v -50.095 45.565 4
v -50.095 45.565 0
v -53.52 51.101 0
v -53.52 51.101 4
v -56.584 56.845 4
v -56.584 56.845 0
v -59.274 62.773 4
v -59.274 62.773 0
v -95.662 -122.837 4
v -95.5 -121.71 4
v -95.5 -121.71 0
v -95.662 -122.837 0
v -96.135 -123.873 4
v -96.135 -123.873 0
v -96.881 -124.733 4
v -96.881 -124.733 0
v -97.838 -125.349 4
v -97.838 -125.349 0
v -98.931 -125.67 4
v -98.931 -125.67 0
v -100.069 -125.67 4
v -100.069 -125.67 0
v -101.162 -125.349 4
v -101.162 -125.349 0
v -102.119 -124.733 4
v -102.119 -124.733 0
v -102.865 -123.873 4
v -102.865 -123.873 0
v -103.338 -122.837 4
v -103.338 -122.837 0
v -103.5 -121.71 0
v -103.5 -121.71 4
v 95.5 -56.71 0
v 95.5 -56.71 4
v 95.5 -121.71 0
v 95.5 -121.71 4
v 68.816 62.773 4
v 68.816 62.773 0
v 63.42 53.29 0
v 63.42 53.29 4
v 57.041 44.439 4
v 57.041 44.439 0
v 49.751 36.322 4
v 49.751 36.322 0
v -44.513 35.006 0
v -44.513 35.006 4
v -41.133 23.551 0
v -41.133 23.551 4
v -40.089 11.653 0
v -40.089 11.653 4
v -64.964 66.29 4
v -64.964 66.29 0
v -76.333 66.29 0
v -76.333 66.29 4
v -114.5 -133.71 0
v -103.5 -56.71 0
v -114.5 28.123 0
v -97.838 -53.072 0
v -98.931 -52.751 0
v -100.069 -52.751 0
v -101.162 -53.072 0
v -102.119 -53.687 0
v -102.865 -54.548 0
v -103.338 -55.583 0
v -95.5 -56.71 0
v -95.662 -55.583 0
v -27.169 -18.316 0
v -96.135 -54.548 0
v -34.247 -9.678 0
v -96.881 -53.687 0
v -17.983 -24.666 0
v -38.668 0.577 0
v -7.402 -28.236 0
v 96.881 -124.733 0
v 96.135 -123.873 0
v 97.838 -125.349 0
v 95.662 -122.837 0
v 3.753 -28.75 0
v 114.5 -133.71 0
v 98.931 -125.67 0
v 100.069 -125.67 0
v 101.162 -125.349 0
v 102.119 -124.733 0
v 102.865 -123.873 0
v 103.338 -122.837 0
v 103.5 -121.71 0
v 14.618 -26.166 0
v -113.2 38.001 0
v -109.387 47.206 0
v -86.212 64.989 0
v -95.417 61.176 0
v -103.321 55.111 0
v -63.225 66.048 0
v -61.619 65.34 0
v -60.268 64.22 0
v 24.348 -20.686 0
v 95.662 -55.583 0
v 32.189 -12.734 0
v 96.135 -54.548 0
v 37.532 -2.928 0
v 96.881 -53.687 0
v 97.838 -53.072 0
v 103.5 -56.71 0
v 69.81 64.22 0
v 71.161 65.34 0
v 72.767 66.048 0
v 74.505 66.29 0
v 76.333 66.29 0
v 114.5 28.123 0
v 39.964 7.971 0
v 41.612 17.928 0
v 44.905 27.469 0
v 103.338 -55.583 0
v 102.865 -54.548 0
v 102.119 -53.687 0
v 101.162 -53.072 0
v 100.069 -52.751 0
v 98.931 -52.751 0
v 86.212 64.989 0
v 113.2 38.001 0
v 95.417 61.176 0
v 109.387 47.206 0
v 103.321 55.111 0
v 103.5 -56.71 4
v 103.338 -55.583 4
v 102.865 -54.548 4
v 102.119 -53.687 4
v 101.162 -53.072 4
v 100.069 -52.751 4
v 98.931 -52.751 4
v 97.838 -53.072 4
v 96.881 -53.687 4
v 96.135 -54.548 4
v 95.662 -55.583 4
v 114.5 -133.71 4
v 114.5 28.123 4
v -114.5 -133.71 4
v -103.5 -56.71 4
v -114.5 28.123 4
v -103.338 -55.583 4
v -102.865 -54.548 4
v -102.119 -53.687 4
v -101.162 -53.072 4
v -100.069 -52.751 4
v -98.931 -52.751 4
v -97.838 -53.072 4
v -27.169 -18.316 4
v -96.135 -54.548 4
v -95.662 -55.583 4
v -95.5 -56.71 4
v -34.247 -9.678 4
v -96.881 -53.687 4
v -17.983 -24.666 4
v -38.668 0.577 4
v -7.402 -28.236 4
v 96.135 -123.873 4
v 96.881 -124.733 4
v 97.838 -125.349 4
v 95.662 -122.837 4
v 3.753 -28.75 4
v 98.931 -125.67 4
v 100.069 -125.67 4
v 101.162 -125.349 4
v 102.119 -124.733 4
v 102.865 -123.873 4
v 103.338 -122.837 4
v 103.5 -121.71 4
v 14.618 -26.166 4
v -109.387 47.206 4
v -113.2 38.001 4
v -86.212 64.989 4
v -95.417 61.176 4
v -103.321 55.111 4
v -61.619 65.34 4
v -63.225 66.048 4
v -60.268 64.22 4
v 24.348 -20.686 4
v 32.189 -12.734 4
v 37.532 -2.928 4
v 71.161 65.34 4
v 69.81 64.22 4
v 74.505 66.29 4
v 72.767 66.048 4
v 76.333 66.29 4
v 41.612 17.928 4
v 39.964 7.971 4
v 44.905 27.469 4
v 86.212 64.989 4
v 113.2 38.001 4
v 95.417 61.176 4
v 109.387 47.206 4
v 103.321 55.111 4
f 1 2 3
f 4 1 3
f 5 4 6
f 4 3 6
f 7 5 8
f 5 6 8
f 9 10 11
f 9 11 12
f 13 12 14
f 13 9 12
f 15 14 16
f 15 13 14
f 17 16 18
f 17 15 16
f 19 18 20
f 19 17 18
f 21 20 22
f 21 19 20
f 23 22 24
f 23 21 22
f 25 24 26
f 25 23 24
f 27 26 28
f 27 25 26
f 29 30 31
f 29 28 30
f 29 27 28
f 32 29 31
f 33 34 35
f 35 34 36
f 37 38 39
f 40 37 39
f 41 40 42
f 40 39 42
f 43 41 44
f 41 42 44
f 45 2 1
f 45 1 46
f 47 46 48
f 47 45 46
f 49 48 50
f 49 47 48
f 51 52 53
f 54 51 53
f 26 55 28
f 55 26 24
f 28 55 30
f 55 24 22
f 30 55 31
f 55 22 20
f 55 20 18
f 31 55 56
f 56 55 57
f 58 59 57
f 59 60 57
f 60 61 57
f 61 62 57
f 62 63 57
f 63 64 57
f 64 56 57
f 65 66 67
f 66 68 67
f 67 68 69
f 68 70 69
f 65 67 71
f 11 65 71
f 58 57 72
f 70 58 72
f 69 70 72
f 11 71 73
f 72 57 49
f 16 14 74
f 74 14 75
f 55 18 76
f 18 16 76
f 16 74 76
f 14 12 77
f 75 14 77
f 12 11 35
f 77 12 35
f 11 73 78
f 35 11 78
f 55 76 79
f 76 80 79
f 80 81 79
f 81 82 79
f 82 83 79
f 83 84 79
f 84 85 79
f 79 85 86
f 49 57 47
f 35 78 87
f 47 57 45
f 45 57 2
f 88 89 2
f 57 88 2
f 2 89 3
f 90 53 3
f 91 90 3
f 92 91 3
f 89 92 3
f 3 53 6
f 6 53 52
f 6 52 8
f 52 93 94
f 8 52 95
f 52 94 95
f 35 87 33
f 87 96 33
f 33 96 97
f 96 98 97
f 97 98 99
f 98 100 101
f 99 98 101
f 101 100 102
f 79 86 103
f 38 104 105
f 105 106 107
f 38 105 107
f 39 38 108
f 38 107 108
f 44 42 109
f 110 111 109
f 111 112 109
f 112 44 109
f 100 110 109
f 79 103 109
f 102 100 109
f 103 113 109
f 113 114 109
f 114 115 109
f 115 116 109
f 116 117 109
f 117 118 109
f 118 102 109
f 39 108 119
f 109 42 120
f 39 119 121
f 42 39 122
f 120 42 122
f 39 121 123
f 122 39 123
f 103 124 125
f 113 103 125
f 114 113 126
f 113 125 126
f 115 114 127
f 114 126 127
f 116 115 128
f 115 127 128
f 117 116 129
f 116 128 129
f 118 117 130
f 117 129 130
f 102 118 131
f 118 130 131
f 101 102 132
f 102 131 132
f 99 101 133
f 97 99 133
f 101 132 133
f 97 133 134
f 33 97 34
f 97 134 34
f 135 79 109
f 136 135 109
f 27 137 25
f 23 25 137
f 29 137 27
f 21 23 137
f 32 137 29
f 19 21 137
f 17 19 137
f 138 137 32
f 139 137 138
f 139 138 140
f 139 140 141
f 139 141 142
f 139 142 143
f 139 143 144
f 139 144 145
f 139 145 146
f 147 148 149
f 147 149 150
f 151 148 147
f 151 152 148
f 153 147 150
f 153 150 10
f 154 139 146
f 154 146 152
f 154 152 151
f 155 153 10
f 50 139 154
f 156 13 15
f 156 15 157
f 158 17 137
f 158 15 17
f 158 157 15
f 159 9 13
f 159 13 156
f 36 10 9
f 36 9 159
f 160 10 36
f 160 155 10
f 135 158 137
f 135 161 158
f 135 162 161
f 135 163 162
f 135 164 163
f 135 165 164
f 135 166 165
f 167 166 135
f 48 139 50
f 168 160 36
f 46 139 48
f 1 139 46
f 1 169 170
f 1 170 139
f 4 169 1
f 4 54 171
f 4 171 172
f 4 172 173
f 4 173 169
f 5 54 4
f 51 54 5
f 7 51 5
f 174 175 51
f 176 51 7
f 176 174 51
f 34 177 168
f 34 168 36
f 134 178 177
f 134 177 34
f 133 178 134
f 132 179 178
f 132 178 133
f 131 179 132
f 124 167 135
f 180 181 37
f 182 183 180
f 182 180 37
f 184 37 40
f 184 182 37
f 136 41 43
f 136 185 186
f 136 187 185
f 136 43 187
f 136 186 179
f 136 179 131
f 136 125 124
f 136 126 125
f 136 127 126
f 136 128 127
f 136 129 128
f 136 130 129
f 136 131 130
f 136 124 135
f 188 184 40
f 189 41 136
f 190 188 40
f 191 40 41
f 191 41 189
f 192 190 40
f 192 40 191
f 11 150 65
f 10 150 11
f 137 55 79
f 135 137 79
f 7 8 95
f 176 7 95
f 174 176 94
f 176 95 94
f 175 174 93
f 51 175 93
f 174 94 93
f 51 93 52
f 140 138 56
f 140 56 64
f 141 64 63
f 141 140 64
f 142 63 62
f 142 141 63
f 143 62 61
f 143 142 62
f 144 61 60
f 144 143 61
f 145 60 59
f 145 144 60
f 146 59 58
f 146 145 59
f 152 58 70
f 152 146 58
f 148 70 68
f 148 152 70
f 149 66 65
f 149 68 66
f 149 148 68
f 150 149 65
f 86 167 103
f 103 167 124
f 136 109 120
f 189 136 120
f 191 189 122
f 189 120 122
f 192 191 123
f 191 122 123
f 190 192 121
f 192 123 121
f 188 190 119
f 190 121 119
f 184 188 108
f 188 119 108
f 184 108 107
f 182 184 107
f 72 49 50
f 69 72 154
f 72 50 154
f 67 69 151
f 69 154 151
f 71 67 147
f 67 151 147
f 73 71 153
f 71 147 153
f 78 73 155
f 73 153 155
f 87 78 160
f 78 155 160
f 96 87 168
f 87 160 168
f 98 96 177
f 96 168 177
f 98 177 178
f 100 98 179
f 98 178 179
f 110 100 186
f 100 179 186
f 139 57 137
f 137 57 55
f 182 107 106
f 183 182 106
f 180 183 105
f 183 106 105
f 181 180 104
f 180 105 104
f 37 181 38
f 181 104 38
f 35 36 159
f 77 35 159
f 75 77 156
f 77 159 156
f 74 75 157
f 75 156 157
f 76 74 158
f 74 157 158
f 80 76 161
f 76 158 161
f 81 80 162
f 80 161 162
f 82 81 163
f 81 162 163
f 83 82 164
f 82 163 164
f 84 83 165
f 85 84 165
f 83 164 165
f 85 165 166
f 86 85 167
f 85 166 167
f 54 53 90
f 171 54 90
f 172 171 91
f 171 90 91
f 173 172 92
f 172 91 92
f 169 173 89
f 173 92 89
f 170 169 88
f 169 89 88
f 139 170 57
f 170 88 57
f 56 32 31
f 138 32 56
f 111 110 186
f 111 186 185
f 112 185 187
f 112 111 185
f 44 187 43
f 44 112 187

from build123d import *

# Parameters (mm, degrees)
BOSS_EXTRUDE1_DEPTH = 4
CUT_EXTRUDE1_DEPTH  = 10
SKETCH6_R           = 40.091527734
CUT_EXTRUDE2_DEPTH  = 4
FILLET1_START       = -1
FILLET1_DEPTH       = 6


with BuildPart() as part:
    # Sketch1 → Boss-Extrude1 (new body)
    with BuildSketch(Plane.XY):
        with BuildLine():
            Line((76.333328469, 66.289722012), (74.505251863, 66.289722012))
            ThreePointArc((74.505251863, 66.289722012), (71.161019545, 65.339696261), (68.815702909, 62.773389851))
            ThreePointArc((68.815702909, 62.773389851), (60.349327785, 48.779313667), (49.750676494, 36.322096209))
            ThreePointArc((49.750676494, 36.322096209), (34.635353478, 21.965885228), (23.967617679, 4.055742947))
            ThreePointArc((23.967617679, 4.055742947), (14.404733147, -9.267078846), (-1.356711824, -13.797331986))
            ThreePointArc((-1.356711824, -13.797331986), (-15.492367955, -8.455246222), (-23.967617153, 4.055741173))
            ThreePointArc((-23.967617153, 4.055741173), (-31.555286979, 21.388261286), (-43.172925895, 36.322097125))
            ThreePointArc((-43.172925895, 36.322097125), (-52.235366406, 48.931803578), (-59.274045863, 62.773390061))
            ThreePointArc((-59.274045863, 62.773390061), (-61.619362494, 65.339696323), (-64.963594711, 66.289722012))
            Line((-64.963594711, 66.289722012), (-76.333336807, 66.289722012))
            ThreePointArc((-76.333336807, 66.289722012), (-103.321243377, 55.110962932), (-114.5, 28.123055345))
            Line((-114.5, 28.123055345), (-114.5, -133.710277988))
            Line((-114.5, -133.710277988), (114.5, -133.710277988))
            Line((114.5, -133.710277988), (114.5, 28.123055345))
            ThreePointArc((114.5, 28.123055345), (103.321240429, 55.11096588), (76.333328469, 66.289722012))
        make_face()
    extrude(amount=BOSS_EXTRUDE1_DEPTH)

    # Sketch2 → Cut-Extrude1 (cut)
    with BuildSketch(Plane.XY.offset(4)):
        with BuildLine():
            Line((-95.500001569, -56.710277988), (-95.500001569, -121.710277988))
            ThreePointArc((-95.500001569, -121.710277988), (-99.500001569, -125.710277988), (-103.500001569, -121.710277988))
            Line((-103.500001569, -121.710277988), (-103.500001569, -56.710277988))
            ThreePointArc((-103.500001569, -56.710277988), (-99.500001569, -52.710277988), (-95.500001569, -56.710277988))
        make_face()
        with BuildLine():
            Line((95.500001569, -56.710277988), (95.500001569, -121.710277988))
            ThreePointArc((95.500001569, -121.710277988), (99.500001569, -125.710277988), (103.500001569, -121.710277988))
            Line((103.500001569, -121.710277988), (103.500001569, -56.710277988))
            ThreePointArc((103.500001569, -56.710277988), (99.500001569, -52.710277988), (95.500001569, -56.710277988))
        make_face()
    extrude(amount=-CUT_EXTRUDE1_DEPTH, mode=Mode.SUBTRACT)

    # Sketch6 → Cut-Extrude2 (cut)
    with BuildSketch(Plane.XY.offset(4)):
        with Locations((-1.216e-06, 11.16582753)):
            Circle(SKETCH6_R)
    extrude(amount=-CUT_EXTRUDE2_DEPTH, mode=Mode.SUBTRACT)

    # Fillet1: read off the stored shape, not the designer's step
    # Fillet1 outline → Fillet1 (cut)
    with BuildSketch(Plane.XY.offset(FILLET1_START)):
        with BuildLine():
            ThreePointArc((-43.172925895, 36.322097125), (-46.764931779, 40.845410754), (-50.094550883, 45.56521044))
            ThreePointArc((-50.094550883, 45.56521044), (-42.536890866, 29.36311637), (-40.088563254, 11.653464507))
            ThreePointArc((-40.088563254, 11.653464507), (-39.059263062, 20.20489054), (-36.227182581, 28.339118606))
            ThreePointArc((-36.227182581, 28.339118606), (-39.561558424, 32.4511088), (-43.172925895, 36.322097125))
        make_face()
        with BuildLine():
            ThreePointArc((37.500310301, 25.345292688), (39.69442098, 16.794632252), (39.964034241, 7.971071505))
            ThreePointArc((39.964034241, 7.971071505), (43.057284902, 22.767959834), (49.750676494, 36.322096209))
            ThreePointArc((49.750676494, 36.322096209), (43.328961969, 31.16463037), (37.500310301, 25.345292688))
        make_face()
    extrude(amount=FILLET1_DEPTH, mode=Mode.SUBTRACT)


solid = part.part
